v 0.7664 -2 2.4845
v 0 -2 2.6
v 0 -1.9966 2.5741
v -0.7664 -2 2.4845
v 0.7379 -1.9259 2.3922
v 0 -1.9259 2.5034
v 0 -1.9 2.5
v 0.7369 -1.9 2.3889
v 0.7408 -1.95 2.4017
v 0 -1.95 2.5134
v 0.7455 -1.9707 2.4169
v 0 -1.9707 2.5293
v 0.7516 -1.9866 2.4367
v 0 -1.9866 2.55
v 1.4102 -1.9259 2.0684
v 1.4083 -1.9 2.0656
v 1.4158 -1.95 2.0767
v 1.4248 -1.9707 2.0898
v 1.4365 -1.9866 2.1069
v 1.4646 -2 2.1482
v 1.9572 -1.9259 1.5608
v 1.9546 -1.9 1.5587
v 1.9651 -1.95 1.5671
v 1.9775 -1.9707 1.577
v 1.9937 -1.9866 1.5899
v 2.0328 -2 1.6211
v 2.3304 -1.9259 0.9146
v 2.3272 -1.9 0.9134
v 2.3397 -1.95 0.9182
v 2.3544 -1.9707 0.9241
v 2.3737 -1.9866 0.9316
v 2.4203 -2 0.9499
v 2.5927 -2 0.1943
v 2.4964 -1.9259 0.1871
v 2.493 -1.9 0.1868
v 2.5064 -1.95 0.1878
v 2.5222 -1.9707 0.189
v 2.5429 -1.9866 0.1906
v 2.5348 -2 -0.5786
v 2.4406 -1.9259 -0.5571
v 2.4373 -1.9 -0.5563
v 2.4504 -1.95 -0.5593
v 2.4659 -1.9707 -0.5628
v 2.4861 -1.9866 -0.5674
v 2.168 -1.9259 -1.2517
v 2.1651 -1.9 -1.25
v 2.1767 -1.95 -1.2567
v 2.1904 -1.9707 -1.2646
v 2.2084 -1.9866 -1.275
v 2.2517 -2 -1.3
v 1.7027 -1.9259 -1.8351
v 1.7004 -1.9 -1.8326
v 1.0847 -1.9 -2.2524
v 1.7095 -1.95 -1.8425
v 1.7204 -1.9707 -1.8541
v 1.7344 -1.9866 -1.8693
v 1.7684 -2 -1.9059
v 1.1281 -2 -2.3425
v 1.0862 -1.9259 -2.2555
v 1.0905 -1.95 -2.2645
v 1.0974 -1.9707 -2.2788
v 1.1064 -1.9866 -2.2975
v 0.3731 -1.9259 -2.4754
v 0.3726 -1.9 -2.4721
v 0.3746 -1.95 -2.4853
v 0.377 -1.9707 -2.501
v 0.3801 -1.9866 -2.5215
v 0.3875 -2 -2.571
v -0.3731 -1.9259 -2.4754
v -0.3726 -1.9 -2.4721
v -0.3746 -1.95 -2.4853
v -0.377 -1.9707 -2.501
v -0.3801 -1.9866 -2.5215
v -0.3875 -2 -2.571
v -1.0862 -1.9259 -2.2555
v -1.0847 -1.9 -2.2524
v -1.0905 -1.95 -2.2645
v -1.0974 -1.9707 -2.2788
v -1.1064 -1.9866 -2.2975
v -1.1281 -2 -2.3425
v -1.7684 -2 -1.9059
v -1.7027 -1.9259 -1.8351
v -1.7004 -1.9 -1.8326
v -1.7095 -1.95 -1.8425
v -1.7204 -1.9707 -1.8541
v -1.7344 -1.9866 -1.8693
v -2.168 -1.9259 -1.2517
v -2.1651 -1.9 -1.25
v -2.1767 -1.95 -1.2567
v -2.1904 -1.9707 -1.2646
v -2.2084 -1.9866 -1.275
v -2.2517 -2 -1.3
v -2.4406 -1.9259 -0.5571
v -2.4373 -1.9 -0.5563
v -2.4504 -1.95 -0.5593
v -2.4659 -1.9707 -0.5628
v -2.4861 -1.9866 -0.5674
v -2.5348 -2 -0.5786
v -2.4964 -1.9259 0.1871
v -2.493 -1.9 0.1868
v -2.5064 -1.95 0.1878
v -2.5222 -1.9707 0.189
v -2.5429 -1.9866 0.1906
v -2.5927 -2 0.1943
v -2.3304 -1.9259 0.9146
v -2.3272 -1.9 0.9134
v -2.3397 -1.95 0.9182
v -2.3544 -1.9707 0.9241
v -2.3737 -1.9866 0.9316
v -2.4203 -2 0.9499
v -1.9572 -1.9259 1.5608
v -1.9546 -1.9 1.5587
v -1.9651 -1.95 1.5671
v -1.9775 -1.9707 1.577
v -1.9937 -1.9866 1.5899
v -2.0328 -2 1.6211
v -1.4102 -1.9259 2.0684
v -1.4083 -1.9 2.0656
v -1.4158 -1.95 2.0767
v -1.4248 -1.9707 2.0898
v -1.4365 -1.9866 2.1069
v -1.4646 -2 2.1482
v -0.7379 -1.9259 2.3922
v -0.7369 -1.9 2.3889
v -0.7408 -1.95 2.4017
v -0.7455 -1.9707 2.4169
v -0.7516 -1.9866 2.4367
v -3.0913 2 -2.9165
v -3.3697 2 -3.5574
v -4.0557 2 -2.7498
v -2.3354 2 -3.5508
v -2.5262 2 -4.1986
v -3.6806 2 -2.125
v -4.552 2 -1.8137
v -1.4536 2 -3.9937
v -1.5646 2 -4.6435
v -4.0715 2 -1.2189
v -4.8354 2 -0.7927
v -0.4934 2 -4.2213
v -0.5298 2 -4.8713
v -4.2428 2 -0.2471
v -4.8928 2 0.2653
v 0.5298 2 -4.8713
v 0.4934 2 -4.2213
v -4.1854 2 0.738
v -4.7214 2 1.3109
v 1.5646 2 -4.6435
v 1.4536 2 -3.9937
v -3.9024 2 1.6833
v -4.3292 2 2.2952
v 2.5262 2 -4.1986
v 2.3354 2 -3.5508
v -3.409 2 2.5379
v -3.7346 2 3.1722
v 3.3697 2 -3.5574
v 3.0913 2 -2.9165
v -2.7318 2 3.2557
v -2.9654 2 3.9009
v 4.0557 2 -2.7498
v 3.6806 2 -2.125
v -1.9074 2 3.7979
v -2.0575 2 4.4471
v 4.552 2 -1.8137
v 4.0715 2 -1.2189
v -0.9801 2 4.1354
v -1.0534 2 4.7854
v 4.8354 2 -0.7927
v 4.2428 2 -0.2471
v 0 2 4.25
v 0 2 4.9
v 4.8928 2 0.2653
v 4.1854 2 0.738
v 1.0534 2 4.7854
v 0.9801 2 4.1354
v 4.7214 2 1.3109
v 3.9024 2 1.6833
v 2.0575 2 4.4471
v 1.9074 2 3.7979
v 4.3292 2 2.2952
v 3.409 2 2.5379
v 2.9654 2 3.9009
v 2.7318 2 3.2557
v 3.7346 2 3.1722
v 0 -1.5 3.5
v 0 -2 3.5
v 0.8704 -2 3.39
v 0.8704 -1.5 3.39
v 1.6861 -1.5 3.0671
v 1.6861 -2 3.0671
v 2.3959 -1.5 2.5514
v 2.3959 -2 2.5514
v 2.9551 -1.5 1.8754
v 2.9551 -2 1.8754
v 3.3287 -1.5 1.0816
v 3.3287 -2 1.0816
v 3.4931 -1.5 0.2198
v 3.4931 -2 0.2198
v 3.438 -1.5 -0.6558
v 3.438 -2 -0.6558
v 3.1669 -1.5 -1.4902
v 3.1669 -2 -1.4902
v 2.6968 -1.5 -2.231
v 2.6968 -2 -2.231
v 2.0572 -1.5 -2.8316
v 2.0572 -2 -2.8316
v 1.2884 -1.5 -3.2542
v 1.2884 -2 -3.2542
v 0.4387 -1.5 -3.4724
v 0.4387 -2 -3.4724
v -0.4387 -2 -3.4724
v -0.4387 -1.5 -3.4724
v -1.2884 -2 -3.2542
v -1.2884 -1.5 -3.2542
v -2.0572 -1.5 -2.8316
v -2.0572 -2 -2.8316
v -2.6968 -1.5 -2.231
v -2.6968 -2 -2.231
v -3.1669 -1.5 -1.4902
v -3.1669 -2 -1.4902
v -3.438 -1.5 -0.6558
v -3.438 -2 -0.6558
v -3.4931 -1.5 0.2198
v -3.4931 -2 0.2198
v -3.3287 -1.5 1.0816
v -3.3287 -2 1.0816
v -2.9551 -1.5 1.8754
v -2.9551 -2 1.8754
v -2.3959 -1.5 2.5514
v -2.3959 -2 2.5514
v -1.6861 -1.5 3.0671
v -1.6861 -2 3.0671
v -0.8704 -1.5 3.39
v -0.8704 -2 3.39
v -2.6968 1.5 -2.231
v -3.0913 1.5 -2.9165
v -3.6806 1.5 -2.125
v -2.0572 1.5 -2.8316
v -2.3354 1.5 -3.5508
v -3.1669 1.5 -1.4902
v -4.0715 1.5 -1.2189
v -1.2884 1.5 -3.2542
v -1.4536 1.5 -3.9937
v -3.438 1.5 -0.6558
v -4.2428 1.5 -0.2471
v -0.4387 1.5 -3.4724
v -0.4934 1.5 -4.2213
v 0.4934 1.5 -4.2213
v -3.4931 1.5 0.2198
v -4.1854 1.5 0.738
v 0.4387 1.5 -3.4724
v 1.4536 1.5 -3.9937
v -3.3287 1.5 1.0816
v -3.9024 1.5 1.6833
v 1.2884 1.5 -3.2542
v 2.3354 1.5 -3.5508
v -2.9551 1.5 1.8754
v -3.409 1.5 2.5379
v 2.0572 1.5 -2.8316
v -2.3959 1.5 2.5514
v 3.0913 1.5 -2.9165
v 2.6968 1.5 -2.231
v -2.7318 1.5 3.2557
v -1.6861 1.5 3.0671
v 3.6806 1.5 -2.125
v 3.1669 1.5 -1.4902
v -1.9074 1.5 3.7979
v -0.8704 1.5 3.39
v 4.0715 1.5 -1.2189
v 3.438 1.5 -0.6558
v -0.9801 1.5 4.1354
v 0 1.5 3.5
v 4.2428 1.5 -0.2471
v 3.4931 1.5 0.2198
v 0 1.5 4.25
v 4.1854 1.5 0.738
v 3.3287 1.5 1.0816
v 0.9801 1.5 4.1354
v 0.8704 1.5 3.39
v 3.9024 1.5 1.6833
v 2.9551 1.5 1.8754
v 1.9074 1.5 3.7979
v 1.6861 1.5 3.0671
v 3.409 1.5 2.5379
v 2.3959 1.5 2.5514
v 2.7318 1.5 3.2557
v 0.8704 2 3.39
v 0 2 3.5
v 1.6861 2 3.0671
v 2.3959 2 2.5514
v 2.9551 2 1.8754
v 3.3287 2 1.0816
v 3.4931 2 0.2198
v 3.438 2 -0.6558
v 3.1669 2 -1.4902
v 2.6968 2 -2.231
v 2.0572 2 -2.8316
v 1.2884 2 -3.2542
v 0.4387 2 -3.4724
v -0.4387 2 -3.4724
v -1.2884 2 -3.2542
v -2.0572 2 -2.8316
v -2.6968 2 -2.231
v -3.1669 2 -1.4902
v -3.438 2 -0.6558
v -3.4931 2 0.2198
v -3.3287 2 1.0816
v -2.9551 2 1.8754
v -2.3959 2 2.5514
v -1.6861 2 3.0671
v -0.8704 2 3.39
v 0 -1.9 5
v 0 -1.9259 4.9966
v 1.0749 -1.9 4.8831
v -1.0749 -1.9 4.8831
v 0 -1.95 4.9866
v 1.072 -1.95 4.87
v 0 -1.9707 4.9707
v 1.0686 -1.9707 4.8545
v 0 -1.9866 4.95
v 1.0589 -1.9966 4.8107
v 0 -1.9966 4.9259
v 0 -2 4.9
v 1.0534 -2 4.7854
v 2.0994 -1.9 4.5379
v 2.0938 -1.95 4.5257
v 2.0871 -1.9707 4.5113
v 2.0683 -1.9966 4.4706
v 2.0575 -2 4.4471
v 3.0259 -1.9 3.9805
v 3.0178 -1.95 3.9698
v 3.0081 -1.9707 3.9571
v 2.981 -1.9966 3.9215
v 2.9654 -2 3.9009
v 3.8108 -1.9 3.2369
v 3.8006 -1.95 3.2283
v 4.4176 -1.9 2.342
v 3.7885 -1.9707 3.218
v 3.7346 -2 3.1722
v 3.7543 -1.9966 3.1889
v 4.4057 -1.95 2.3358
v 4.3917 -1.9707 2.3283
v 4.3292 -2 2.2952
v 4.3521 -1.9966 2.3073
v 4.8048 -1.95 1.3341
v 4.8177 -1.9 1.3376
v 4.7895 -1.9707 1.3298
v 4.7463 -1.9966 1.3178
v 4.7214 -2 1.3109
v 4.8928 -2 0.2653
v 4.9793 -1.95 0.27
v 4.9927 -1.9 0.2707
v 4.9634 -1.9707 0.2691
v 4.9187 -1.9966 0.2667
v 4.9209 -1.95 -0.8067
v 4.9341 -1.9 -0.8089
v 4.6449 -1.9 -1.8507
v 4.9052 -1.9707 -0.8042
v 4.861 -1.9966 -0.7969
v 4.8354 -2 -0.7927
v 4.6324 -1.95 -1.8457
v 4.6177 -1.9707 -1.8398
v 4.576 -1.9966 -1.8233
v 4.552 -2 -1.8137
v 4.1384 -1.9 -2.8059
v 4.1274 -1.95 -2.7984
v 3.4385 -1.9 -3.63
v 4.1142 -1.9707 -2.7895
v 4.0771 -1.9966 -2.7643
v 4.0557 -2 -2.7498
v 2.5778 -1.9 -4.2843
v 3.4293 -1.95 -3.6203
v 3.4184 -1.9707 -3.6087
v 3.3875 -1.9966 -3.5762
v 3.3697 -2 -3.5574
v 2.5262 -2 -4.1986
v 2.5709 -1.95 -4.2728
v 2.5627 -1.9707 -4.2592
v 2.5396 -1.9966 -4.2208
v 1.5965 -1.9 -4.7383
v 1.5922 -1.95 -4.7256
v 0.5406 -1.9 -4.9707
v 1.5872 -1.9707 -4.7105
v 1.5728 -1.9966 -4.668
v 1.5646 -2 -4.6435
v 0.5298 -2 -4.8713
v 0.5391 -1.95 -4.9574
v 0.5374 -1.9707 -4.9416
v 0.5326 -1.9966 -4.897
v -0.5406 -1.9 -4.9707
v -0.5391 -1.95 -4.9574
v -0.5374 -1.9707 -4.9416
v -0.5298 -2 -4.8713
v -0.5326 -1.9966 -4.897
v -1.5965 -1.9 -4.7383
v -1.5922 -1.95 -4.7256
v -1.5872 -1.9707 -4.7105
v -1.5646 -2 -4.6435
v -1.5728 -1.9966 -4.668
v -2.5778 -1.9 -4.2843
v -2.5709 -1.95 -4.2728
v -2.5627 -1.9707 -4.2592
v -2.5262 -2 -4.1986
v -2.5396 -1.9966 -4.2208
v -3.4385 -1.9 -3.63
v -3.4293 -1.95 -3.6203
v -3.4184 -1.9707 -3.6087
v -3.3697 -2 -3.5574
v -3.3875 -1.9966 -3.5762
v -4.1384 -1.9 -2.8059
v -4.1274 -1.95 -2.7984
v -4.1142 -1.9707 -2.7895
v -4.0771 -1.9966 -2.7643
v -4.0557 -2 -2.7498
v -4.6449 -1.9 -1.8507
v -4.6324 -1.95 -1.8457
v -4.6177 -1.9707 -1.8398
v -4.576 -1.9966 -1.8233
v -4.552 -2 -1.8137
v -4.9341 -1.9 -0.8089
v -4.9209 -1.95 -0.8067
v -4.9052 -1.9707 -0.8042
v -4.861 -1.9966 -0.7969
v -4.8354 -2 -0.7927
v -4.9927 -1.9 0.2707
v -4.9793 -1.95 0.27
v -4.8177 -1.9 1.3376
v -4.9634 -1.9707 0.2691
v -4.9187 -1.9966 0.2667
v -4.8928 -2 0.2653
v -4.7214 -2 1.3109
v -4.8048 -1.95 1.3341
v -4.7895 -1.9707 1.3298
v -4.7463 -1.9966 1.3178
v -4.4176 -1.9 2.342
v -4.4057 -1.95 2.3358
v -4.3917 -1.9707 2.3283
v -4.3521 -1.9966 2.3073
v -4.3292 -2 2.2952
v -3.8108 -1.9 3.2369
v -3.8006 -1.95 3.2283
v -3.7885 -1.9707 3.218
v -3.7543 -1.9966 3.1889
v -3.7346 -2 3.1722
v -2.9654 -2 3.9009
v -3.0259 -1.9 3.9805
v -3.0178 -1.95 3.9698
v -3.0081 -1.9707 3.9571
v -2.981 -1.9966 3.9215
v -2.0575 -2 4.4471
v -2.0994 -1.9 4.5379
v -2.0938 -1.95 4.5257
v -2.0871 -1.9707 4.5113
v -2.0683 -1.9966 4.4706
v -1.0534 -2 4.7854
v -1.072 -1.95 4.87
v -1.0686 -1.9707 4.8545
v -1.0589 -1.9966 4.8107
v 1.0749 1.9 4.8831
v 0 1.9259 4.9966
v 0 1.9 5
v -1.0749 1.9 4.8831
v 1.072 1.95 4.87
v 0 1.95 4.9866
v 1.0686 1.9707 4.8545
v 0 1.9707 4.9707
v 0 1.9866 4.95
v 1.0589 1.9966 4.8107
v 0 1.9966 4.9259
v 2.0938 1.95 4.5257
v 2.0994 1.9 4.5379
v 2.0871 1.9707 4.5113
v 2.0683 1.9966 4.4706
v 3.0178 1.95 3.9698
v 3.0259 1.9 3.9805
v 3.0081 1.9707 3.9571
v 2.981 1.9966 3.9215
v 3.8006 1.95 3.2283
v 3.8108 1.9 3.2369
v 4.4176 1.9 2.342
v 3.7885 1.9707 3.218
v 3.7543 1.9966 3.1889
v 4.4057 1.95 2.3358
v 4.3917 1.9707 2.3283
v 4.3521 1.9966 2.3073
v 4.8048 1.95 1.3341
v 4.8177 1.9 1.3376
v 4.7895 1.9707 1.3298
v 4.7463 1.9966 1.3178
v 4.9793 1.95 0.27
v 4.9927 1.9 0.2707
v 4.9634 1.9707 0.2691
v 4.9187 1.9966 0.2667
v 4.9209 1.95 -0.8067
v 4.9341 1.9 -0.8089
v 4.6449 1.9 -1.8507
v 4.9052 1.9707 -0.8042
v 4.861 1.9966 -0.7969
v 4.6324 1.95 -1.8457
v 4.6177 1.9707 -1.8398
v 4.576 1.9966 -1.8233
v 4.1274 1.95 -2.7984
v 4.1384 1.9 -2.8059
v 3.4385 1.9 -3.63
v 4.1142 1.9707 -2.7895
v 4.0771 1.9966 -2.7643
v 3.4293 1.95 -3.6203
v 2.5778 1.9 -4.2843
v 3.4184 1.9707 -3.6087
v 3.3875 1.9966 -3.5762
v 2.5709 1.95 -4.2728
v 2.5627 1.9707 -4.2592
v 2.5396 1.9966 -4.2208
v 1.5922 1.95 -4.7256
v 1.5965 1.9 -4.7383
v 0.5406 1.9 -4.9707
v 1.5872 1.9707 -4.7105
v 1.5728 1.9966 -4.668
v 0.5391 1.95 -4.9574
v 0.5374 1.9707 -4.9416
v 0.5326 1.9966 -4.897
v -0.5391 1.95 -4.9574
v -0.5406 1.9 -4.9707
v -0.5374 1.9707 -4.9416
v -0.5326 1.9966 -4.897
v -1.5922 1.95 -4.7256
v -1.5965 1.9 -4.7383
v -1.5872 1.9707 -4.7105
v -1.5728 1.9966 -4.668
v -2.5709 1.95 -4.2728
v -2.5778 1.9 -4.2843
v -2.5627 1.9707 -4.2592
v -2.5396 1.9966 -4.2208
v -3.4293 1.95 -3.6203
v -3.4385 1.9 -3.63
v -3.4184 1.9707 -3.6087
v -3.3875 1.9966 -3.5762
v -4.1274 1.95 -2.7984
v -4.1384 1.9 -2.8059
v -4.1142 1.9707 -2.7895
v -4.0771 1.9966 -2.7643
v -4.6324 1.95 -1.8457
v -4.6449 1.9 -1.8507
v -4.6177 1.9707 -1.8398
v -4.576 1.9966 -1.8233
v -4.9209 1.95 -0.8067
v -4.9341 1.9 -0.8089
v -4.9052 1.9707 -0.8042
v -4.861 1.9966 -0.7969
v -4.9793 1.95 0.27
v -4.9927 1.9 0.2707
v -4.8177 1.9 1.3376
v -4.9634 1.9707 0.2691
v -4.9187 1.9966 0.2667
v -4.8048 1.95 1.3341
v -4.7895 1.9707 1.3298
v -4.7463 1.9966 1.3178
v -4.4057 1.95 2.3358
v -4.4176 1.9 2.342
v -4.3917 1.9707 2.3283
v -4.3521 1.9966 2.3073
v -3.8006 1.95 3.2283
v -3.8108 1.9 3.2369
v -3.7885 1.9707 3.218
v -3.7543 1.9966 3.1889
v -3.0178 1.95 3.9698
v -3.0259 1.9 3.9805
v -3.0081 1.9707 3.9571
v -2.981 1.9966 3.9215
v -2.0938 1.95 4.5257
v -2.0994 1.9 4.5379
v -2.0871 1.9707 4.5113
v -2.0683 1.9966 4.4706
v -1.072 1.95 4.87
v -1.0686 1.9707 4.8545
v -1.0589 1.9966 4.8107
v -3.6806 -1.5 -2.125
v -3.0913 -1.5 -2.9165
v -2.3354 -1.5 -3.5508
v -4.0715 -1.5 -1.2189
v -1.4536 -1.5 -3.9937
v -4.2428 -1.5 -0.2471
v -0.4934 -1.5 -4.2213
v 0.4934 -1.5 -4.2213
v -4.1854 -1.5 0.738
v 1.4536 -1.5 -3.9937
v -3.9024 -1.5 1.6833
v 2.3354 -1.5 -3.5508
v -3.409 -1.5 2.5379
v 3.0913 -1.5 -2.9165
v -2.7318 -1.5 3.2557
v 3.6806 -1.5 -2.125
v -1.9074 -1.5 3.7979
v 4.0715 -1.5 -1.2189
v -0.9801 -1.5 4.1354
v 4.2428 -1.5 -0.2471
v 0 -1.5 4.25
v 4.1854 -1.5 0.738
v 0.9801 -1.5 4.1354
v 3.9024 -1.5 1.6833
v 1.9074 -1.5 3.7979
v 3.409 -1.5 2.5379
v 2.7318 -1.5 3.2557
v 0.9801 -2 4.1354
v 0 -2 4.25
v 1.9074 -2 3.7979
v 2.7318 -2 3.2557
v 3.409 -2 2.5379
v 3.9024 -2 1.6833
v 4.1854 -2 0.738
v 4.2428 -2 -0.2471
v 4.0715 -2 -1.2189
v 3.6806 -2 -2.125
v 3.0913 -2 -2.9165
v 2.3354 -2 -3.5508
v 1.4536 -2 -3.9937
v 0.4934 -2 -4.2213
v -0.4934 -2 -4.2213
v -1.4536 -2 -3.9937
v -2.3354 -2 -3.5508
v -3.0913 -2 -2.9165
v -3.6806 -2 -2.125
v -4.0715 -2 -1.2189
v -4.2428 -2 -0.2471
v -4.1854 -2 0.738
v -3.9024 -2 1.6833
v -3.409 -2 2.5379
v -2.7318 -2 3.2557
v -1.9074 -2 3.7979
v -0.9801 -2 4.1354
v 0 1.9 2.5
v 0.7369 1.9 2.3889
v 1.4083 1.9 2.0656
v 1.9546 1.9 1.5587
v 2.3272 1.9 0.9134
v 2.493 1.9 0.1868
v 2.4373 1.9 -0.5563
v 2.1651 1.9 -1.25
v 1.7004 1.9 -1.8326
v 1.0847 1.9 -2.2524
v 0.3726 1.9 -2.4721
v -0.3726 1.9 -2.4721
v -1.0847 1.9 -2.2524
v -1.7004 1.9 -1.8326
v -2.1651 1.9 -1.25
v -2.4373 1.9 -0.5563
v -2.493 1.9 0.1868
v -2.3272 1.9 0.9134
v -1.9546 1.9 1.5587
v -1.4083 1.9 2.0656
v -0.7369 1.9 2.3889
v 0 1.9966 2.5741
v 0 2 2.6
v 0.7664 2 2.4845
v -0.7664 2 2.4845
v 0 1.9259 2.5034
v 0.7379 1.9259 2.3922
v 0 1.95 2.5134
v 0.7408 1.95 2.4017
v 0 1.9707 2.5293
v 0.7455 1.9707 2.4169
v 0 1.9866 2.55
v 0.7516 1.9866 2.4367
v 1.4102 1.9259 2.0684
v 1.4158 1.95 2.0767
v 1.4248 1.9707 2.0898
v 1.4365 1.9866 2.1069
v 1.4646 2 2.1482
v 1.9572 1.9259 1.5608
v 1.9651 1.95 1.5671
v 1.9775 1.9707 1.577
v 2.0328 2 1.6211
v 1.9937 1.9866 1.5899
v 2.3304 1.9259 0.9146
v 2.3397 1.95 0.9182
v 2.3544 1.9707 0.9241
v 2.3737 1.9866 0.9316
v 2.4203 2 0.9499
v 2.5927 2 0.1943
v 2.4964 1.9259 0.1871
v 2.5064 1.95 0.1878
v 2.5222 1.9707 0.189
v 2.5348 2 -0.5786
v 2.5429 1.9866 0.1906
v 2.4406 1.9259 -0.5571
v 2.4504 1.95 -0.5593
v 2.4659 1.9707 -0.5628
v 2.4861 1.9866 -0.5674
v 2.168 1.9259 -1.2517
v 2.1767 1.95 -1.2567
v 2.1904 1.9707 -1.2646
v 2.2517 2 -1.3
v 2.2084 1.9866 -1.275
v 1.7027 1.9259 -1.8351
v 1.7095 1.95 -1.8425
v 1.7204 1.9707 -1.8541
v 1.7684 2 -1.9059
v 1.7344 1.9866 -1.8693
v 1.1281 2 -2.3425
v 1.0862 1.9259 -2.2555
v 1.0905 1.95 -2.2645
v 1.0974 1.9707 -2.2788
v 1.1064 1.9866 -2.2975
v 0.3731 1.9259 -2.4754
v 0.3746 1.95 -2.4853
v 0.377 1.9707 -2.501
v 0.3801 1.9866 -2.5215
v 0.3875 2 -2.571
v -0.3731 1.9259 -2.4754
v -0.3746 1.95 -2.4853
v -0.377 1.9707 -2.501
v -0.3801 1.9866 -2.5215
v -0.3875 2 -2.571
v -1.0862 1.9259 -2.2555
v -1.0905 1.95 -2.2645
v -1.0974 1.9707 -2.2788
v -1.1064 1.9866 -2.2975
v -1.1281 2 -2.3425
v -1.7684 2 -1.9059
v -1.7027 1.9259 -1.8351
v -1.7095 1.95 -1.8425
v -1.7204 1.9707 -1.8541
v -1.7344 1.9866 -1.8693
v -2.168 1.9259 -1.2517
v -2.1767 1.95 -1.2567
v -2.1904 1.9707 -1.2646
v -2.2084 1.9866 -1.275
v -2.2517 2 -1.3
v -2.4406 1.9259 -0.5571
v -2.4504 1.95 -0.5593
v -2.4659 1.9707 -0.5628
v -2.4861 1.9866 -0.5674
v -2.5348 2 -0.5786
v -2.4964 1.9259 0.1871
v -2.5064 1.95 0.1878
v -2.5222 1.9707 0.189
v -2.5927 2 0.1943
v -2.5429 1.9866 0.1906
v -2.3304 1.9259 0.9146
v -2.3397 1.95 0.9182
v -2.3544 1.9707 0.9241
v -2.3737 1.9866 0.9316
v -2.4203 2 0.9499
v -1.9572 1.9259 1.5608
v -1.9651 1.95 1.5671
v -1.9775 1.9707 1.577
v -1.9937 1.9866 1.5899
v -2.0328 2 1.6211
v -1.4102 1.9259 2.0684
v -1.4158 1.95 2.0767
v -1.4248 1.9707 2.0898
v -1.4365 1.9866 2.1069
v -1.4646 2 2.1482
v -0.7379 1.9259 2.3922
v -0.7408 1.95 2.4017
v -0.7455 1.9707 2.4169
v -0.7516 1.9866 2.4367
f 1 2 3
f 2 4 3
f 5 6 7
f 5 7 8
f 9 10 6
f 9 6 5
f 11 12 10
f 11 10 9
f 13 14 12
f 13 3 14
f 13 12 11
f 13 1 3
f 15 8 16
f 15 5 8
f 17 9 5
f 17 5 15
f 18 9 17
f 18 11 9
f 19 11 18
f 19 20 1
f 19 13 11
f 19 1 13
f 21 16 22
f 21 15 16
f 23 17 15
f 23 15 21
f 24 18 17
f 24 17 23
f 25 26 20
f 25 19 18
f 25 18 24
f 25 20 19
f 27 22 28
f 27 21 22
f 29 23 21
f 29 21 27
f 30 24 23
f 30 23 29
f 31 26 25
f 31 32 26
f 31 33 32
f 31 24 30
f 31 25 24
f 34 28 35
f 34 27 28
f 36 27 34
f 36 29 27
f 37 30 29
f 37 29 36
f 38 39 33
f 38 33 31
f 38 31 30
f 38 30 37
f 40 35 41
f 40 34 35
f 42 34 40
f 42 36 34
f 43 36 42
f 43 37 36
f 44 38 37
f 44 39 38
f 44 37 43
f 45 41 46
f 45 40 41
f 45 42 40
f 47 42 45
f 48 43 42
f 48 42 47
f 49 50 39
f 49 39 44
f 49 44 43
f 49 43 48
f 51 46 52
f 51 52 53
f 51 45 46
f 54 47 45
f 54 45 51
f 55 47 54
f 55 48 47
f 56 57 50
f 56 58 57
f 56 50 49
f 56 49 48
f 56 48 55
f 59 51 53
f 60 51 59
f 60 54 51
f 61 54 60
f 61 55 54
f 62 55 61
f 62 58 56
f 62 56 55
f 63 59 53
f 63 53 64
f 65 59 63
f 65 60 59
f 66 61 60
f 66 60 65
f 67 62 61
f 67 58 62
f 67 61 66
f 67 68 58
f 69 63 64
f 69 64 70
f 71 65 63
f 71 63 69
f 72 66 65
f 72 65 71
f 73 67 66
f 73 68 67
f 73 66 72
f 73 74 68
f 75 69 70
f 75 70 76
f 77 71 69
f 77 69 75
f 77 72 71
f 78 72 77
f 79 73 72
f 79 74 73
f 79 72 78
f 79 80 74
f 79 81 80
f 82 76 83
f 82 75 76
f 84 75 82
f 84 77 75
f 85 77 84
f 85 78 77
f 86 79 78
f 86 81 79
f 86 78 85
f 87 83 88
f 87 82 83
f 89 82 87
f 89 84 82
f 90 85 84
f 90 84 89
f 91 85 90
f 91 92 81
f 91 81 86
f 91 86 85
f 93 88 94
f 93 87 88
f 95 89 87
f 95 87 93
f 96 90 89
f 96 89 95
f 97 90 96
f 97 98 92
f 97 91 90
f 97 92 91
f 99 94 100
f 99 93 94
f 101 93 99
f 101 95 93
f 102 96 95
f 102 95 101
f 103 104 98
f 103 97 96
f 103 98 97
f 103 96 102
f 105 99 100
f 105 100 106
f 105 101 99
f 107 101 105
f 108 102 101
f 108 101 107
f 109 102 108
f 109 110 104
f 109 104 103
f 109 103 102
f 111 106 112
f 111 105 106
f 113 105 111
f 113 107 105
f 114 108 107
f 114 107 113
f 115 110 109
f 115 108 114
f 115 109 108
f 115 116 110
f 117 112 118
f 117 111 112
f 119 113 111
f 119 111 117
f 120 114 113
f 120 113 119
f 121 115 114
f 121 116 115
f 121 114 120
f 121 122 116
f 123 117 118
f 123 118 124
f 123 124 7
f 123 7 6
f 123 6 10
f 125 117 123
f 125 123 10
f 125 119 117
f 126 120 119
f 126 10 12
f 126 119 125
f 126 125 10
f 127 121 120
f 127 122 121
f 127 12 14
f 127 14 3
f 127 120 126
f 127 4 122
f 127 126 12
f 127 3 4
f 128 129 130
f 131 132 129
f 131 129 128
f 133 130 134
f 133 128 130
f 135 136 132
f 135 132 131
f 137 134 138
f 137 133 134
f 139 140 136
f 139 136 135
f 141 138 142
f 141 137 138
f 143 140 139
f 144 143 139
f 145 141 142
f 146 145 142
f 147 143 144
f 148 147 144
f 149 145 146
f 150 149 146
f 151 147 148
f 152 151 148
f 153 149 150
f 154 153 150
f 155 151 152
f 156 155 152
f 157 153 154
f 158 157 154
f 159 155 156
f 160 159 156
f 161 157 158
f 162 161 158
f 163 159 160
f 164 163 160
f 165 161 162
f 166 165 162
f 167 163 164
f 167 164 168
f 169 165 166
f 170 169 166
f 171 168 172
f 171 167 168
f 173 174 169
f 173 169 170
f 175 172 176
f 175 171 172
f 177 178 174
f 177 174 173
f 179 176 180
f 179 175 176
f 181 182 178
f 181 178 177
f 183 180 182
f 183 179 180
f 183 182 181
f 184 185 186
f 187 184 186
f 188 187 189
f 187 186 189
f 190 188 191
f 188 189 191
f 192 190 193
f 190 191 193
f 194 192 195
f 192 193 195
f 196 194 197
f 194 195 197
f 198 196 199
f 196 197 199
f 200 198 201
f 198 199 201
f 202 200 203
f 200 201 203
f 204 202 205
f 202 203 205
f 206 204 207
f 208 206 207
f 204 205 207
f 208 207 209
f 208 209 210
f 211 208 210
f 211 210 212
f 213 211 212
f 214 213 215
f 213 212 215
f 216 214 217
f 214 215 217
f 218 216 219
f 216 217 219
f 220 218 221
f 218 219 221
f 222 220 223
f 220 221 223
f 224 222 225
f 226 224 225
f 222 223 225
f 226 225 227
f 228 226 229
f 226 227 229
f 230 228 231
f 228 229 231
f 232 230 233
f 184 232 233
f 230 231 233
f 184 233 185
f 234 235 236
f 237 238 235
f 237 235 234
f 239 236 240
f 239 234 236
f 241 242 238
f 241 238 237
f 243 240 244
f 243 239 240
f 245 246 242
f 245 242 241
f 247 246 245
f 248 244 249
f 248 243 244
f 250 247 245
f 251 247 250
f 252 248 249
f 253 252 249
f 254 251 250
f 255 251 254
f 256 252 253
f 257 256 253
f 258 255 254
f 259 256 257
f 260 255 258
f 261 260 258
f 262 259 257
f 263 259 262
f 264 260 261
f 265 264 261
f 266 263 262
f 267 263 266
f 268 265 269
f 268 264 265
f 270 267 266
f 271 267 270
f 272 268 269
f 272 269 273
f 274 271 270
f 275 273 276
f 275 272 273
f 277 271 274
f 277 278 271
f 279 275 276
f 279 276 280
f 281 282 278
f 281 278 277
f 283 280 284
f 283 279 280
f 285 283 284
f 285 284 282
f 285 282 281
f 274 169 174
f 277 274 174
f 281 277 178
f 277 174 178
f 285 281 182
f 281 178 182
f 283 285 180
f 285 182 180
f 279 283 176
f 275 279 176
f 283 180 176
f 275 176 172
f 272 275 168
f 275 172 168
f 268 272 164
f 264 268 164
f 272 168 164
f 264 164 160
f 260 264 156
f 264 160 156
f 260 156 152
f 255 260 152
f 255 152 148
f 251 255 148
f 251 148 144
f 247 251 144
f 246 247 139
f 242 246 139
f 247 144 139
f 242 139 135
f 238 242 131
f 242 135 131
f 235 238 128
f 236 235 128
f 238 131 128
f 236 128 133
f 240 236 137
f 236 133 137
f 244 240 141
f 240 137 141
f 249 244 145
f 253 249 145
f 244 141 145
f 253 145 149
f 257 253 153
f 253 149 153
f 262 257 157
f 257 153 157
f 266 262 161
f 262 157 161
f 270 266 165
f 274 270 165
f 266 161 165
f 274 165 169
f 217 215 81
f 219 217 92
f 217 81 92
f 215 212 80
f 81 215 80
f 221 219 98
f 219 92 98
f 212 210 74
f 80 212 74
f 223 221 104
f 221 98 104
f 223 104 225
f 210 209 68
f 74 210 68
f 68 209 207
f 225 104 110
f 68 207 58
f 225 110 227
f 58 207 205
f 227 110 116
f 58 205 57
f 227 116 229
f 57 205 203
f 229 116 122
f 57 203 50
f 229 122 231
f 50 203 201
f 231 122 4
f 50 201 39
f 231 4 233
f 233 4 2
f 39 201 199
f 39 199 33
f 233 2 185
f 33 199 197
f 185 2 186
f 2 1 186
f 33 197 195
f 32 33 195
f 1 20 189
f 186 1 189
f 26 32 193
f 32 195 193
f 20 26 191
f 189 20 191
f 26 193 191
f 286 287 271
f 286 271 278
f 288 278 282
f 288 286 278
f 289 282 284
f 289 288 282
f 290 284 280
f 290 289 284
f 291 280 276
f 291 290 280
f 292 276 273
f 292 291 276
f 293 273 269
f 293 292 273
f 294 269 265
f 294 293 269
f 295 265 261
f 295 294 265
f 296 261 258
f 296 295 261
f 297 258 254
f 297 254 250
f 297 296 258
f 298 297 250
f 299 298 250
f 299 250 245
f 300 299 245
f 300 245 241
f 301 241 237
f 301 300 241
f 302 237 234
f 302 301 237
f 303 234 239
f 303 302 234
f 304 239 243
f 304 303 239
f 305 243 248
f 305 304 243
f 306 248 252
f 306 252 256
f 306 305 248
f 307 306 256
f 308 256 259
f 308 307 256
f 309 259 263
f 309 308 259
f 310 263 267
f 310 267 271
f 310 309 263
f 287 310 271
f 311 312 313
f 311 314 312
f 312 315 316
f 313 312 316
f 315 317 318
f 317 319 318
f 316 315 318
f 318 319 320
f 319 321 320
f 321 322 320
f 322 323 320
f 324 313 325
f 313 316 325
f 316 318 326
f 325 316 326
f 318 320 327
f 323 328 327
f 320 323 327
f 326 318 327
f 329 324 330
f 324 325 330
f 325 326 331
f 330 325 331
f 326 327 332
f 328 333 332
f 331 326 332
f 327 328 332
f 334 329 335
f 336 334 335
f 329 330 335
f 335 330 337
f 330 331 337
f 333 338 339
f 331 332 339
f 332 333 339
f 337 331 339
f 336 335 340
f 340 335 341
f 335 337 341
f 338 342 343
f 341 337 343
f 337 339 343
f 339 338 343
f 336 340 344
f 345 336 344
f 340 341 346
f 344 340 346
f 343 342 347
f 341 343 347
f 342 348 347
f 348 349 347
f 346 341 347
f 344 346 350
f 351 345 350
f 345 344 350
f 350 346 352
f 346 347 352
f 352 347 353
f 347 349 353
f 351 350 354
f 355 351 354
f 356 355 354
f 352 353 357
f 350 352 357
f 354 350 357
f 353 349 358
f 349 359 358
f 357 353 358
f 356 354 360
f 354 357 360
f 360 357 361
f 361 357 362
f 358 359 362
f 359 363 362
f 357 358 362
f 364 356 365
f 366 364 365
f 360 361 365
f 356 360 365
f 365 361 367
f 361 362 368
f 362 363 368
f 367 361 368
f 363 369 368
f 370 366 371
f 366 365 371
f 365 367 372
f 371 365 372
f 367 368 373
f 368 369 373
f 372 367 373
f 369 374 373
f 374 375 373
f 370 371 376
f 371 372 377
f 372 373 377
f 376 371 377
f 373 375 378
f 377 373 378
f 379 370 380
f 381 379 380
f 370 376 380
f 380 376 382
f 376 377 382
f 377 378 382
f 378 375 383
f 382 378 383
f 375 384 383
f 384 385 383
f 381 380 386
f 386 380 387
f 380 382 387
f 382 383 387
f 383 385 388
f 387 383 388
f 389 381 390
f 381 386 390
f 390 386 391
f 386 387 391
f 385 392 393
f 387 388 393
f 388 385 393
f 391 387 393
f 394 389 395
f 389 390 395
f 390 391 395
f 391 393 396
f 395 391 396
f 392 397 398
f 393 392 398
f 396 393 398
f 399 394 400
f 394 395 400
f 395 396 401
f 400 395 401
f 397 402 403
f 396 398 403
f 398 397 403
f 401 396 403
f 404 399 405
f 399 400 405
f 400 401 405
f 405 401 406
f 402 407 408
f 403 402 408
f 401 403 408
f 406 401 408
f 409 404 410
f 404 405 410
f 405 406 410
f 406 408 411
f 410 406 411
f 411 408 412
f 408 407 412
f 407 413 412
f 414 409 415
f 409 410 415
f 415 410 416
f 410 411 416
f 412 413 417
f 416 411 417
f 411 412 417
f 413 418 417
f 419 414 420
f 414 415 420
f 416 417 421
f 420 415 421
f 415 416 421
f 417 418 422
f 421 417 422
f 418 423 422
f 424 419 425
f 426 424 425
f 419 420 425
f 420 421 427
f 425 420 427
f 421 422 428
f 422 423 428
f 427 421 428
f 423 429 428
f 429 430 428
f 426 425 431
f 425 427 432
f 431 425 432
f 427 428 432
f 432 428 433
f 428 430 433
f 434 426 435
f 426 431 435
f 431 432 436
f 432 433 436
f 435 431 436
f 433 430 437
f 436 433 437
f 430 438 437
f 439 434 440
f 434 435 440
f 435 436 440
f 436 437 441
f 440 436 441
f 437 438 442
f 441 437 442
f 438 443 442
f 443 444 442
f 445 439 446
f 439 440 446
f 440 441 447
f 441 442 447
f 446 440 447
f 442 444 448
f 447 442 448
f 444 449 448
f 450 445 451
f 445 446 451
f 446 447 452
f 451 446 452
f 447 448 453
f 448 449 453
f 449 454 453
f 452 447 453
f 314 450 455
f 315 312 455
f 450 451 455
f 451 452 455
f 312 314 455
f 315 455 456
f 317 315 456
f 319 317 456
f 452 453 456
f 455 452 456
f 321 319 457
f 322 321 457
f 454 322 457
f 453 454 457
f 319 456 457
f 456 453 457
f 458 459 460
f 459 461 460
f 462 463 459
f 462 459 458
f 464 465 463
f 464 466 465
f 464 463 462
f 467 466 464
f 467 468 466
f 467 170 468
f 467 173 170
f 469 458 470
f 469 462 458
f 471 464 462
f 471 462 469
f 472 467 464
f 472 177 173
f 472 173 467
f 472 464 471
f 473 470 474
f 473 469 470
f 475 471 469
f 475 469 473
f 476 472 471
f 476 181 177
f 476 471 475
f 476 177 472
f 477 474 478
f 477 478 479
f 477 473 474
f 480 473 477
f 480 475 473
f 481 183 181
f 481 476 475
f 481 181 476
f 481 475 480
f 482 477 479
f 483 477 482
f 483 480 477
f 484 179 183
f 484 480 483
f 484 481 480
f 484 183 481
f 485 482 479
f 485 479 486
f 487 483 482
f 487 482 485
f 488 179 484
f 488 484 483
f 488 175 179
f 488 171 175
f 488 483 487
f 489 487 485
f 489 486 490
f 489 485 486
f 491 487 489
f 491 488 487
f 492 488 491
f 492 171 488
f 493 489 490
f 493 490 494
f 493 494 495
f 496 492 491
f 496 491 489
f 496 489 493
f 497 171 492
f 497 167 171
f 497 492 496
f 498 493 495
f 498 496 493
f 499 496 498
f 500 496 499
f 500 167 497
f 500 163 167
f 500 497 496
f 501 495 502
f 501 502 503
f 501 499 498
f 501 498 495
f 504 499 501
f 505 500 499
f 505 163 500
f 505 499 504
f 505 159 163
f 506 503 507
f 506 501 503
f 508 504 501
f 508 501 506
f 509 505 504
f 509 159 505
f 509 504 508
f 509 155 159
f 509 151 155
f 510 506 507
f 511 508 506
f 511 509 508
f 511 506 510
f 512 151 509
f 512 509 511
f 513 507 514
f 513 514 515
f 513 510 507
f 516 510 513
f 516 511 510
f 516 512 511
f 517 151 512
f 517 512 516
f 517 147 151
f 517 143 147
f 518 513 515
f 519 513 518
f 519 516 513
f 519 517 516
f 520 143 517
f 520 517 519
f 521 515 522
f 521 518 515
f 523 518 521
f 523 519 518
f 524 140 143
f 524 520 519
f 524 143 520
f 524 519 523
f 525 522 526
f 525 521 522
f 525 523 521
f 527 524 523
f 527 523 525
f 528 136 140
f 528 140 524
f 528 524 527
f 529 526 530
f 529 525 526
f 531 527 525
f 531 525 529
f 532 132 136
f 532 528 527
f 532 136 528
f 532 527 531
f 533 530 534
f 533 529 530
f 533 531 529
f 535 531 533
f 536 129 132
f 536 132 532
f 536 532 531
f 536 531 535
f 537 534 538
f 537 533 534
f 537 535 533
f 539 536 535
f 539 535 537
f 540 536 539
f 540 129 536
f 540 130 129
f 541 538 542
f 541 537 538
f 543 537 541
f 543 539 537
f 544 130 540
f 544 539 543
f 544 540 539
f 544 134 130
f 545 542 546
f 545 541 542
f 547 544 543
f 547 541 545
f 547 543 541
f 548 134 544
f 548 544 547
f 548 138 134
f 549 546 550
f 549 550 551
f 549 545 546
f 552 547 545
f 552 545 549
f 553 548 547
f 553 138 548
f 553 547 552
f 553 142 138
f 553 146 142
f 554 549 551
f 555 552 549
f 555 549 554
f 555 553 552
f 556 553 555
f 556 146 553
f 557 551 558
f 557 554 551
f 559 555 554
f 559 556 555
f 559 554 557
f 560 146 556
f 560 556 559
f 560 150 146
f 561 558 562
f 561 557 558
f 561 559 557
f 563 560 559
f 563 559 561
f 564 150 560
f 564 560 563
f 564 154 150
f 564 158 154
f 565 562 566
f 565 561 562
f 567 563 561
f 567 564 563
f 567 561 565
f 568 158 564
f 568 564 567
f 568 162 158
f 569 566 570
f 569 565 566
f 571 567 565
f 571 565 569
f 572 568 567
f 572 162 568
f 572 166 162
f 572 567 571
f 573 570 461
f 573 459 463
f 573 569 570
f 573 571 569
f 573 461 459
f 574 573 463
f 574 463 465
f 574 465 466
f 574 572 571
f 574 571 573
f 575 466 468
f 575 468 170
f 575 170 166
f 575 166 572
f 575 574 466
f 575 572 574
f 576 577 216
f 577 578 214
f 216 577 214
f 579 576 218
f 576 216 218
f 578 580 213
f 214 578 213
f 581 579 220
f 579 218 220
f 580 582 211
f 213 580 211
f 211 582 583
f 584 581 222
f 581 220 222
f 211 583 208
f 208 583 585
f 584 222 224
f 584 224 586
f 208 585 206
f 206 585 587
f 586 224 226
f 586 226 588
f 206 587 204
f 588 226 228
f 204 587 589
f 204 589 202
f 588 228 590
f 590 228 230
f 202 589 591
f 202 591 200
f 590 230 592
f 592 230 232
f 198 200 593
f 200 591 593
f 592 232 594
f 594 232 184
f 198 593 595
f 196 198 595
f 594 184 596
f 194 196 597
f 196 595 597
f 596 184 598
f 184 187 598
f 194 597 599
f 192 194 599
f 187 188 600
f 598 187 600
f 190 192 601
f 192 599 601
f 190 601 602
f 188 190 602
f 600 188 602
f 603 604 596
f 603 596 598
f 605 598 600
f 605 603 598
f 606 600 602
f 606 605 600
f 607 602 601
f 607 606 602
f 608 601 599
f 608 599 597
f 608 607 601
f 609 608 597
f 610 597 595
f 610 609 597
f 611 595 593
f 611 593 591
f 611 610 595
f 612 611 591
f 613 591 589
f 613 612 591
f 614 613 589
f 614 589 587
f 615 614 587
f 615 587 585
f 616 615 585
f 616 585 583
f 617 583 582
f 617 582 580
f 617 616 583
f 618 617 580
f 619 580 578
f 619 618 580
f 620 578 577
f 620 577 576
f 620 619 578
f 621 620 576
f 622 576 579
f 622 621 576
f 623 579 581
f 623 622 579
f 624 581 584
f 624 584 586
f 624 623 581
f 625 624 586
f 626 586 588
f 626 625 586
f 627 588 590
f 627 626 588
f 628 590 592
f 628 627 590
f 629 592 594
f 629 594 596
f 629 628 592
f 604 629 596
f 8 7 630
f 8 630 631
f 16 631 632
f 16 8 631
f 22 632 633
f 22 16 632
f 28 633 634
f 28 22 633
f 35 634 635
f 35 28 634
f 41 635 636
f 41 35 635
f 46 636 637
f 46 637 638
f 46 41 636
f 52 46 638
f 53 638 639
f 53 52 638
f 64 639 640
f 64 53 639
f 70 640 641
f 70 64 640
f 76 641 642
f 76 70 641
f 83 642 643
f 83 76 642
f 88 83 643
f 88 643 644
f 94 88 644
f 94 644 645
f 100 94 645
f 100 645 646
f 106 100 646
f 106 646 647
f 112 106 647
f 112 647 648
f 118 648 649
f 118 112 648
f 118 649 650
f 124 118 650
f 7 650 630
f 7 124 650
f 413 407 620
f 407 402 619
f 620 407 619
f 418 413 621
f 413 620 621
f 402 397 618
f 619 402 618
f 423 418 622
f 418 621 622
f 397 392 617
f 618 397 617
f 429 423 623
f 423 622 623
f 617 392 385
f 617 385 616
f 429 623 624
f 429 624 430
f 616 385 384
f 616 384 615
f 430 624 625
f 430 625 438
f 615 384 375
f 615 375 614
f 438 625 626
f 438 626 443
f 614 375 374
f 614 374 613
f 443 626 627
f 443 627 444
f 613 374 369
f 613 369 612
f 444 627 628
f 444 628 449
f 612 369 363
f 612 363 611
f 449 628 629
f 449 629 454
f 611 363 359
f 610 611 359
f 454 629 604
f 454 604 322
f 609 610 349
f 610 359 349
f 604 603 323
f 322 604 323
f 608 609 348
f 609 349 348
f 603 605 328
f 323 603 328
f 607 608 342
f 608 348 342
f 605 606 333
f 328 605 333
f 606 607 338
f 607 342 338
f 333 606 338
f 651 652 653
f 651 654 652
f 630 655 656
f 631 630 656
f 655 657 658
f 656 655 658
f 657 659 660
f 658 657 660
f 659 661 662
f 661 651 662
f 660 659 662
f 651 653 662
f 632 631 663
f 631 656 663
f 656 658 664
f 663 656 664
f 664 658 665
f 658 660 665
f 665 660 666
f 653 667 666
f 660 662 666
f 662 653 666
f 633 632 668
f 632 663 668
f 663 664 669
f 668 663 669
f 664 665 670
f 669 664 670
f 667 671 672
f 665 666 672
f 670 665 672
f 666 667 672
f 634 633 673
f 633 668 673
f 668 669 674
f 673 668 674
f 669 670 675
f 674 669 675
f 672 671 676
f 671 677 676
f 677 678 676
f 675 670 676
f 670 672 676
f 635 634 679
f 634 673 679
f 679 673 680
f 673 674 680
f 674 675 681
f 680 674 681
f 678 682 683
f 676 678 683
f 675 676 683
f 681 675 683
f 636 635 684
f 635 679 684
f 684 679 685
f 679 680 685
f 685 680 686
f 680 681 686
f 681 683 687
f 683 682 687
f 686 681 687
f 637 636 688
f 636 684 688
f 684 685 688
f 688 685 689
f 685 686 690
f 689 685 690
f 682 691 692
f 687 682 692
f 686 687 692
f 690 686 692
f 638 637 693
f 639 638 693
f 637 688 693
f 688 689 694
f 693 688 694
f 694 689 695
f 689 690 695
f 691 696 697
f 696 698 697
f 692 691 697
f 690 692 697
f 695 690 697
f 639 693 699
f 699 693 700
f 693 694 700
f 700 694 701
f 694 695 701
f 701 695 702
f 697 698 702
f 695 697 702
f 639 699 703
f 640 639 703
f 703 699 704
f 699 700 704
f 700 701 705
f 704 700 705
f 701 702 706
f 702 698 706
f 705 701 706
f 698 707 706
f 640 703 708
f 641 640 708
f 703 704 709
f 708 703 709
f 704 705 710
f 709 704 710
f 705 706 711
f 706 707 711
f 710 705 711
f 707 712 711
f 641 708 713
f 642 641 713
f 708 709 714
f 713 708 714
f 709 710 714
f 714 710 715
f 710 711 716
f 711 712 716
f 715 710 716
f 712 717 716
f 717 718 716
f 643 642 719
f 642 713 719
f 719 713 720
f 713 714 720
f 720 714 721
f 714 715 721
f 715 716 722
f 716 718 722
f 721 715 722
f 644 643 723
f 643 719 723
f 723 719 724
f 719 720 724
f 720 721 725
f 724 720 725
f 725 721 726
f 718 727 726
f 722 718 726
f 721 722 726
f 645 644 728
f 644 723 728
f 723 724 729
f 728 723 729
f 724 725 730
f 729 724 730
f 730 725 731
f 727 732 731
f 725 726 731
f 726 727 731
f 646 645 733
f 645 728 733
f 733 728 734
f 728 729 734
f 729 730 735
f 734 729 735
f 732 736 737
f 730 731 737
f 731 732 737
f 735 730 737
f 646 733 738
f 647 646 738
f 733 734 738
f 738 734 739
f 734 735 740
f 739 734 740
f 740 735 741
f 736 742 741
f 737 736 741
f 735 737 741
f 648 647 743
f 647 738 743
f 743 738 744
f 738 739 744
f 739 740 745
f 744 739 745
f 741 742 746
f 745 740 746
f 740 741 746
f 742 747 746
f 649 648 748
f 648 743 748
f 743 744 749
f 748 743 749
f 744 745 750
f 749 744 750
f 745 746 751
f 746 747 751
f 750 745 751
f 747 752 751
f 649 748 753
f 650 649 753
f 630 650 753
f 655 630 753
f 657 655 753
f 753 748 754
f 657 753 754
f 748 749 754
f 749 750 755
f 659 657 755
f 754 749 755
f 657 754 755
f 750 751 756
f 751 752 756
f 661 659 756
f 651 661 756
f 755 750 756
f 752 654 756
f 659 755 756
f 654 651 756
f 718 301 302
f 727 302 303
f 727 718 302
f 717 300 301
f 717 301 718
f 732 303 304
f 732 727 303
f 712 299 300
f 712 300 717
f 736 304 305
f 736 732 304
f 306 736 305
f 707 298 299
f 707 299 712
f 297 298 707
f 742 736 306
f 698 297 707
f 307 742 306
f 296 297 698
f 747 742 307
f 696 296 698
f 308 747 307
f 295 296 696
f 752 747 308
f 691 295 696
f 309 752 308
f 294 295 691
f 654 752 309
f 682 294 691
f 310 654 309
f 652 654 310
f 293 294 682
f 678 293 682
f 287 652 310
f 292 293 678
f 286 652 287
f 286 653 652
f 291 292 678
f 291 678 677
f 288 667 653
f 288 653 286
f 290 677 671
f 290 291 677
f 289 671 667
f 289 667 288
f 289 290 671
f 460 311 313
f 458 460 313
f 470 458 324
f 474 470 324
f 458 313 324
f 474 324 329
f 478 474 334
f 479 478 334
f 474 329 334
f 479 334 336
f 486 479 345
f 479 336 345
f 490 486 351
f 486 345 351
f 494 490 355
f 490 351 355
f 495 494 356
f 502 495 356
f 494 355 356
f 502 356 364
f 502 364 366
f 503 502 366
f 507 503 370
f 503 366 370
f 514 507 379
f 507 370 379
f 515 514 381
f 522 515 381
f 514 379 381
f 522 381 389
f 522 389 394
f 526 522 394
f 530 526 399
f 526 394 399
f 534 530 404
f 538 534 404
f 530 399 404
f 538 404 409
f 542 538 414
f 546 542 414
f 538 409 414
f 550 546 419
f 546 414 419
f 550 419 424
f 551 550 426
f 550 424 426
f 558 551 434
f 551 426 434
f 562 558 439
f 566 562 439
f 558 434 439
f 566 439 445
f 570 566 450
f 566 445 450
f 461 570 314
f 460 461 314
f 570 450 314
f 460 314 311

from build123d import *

# Parameters (mm, degrees)
BOSS_EXTRUDE1_DEPTH      = 2
BOSS_EXTRUDE1_DEPTH_BACK = 2
SKETCH1_R                = 5
SKETCH1_R_2              = 2.5
FILLET1_R                = 0.1
SKETCH2_R                = 4.25
SKETCH2_R_2              = 3.5
CUT_EXTRUDE1_DEPTH       = 0.5


with BuildPart() as part:
    # Sketch1 → Boss-Extrude1 (new, two sides: drawn at the far end of the back side and taken through both)
    with BuildSketch(Plane(origin=(0, 0, 0), x_dir=(1, 0, 0), z_dir=(0, 1, 0)).offset(-BOSS_EXTRUDE1_DEPTH_BACK)):
        Circle(SKETCH1_R)
        Circle(SKETCH1_R_2, mode=Mode.SUBTRACT)
    extrude(amount=BOSS_EXTRUDE1_DEPTH + BOSS_EXTRUDE1_DEPTH_BACK)

    # Fillet1
    fillet1_edges = [part.edges().sort_by_distance(p)[0] for p in [
        (-2.5, -2, 0),
        (-5, -2, 0),
        (-5, 2, 0),
        (-2.5, 2, 0),
    ]]
    fillet(fillet1_edges, radius=FILLET1_R)

    # Sketch2 → Cut-Extrude1 (cut)
    with BuildSketch(Plane(origin=(0, 2, 0), x_dir=(1, 0, 0), z_dir=(0, 1, 0))):
        Circle(SKETCH2_R)
        Circle(SKETCH2_R_2, mode=Mode.SUBTRACT)
    cut_extrude1 = extrude(amount=-CUT_EXTRUDE1_DEPTH, mode=Mode.SUBTRACT)

    # Mirror1: Cut-Extrude1 across plane
    add(cut_extrude1.mirror(Plane.ZX), mode=Mode.SUBTRACT)


solid = part.part
